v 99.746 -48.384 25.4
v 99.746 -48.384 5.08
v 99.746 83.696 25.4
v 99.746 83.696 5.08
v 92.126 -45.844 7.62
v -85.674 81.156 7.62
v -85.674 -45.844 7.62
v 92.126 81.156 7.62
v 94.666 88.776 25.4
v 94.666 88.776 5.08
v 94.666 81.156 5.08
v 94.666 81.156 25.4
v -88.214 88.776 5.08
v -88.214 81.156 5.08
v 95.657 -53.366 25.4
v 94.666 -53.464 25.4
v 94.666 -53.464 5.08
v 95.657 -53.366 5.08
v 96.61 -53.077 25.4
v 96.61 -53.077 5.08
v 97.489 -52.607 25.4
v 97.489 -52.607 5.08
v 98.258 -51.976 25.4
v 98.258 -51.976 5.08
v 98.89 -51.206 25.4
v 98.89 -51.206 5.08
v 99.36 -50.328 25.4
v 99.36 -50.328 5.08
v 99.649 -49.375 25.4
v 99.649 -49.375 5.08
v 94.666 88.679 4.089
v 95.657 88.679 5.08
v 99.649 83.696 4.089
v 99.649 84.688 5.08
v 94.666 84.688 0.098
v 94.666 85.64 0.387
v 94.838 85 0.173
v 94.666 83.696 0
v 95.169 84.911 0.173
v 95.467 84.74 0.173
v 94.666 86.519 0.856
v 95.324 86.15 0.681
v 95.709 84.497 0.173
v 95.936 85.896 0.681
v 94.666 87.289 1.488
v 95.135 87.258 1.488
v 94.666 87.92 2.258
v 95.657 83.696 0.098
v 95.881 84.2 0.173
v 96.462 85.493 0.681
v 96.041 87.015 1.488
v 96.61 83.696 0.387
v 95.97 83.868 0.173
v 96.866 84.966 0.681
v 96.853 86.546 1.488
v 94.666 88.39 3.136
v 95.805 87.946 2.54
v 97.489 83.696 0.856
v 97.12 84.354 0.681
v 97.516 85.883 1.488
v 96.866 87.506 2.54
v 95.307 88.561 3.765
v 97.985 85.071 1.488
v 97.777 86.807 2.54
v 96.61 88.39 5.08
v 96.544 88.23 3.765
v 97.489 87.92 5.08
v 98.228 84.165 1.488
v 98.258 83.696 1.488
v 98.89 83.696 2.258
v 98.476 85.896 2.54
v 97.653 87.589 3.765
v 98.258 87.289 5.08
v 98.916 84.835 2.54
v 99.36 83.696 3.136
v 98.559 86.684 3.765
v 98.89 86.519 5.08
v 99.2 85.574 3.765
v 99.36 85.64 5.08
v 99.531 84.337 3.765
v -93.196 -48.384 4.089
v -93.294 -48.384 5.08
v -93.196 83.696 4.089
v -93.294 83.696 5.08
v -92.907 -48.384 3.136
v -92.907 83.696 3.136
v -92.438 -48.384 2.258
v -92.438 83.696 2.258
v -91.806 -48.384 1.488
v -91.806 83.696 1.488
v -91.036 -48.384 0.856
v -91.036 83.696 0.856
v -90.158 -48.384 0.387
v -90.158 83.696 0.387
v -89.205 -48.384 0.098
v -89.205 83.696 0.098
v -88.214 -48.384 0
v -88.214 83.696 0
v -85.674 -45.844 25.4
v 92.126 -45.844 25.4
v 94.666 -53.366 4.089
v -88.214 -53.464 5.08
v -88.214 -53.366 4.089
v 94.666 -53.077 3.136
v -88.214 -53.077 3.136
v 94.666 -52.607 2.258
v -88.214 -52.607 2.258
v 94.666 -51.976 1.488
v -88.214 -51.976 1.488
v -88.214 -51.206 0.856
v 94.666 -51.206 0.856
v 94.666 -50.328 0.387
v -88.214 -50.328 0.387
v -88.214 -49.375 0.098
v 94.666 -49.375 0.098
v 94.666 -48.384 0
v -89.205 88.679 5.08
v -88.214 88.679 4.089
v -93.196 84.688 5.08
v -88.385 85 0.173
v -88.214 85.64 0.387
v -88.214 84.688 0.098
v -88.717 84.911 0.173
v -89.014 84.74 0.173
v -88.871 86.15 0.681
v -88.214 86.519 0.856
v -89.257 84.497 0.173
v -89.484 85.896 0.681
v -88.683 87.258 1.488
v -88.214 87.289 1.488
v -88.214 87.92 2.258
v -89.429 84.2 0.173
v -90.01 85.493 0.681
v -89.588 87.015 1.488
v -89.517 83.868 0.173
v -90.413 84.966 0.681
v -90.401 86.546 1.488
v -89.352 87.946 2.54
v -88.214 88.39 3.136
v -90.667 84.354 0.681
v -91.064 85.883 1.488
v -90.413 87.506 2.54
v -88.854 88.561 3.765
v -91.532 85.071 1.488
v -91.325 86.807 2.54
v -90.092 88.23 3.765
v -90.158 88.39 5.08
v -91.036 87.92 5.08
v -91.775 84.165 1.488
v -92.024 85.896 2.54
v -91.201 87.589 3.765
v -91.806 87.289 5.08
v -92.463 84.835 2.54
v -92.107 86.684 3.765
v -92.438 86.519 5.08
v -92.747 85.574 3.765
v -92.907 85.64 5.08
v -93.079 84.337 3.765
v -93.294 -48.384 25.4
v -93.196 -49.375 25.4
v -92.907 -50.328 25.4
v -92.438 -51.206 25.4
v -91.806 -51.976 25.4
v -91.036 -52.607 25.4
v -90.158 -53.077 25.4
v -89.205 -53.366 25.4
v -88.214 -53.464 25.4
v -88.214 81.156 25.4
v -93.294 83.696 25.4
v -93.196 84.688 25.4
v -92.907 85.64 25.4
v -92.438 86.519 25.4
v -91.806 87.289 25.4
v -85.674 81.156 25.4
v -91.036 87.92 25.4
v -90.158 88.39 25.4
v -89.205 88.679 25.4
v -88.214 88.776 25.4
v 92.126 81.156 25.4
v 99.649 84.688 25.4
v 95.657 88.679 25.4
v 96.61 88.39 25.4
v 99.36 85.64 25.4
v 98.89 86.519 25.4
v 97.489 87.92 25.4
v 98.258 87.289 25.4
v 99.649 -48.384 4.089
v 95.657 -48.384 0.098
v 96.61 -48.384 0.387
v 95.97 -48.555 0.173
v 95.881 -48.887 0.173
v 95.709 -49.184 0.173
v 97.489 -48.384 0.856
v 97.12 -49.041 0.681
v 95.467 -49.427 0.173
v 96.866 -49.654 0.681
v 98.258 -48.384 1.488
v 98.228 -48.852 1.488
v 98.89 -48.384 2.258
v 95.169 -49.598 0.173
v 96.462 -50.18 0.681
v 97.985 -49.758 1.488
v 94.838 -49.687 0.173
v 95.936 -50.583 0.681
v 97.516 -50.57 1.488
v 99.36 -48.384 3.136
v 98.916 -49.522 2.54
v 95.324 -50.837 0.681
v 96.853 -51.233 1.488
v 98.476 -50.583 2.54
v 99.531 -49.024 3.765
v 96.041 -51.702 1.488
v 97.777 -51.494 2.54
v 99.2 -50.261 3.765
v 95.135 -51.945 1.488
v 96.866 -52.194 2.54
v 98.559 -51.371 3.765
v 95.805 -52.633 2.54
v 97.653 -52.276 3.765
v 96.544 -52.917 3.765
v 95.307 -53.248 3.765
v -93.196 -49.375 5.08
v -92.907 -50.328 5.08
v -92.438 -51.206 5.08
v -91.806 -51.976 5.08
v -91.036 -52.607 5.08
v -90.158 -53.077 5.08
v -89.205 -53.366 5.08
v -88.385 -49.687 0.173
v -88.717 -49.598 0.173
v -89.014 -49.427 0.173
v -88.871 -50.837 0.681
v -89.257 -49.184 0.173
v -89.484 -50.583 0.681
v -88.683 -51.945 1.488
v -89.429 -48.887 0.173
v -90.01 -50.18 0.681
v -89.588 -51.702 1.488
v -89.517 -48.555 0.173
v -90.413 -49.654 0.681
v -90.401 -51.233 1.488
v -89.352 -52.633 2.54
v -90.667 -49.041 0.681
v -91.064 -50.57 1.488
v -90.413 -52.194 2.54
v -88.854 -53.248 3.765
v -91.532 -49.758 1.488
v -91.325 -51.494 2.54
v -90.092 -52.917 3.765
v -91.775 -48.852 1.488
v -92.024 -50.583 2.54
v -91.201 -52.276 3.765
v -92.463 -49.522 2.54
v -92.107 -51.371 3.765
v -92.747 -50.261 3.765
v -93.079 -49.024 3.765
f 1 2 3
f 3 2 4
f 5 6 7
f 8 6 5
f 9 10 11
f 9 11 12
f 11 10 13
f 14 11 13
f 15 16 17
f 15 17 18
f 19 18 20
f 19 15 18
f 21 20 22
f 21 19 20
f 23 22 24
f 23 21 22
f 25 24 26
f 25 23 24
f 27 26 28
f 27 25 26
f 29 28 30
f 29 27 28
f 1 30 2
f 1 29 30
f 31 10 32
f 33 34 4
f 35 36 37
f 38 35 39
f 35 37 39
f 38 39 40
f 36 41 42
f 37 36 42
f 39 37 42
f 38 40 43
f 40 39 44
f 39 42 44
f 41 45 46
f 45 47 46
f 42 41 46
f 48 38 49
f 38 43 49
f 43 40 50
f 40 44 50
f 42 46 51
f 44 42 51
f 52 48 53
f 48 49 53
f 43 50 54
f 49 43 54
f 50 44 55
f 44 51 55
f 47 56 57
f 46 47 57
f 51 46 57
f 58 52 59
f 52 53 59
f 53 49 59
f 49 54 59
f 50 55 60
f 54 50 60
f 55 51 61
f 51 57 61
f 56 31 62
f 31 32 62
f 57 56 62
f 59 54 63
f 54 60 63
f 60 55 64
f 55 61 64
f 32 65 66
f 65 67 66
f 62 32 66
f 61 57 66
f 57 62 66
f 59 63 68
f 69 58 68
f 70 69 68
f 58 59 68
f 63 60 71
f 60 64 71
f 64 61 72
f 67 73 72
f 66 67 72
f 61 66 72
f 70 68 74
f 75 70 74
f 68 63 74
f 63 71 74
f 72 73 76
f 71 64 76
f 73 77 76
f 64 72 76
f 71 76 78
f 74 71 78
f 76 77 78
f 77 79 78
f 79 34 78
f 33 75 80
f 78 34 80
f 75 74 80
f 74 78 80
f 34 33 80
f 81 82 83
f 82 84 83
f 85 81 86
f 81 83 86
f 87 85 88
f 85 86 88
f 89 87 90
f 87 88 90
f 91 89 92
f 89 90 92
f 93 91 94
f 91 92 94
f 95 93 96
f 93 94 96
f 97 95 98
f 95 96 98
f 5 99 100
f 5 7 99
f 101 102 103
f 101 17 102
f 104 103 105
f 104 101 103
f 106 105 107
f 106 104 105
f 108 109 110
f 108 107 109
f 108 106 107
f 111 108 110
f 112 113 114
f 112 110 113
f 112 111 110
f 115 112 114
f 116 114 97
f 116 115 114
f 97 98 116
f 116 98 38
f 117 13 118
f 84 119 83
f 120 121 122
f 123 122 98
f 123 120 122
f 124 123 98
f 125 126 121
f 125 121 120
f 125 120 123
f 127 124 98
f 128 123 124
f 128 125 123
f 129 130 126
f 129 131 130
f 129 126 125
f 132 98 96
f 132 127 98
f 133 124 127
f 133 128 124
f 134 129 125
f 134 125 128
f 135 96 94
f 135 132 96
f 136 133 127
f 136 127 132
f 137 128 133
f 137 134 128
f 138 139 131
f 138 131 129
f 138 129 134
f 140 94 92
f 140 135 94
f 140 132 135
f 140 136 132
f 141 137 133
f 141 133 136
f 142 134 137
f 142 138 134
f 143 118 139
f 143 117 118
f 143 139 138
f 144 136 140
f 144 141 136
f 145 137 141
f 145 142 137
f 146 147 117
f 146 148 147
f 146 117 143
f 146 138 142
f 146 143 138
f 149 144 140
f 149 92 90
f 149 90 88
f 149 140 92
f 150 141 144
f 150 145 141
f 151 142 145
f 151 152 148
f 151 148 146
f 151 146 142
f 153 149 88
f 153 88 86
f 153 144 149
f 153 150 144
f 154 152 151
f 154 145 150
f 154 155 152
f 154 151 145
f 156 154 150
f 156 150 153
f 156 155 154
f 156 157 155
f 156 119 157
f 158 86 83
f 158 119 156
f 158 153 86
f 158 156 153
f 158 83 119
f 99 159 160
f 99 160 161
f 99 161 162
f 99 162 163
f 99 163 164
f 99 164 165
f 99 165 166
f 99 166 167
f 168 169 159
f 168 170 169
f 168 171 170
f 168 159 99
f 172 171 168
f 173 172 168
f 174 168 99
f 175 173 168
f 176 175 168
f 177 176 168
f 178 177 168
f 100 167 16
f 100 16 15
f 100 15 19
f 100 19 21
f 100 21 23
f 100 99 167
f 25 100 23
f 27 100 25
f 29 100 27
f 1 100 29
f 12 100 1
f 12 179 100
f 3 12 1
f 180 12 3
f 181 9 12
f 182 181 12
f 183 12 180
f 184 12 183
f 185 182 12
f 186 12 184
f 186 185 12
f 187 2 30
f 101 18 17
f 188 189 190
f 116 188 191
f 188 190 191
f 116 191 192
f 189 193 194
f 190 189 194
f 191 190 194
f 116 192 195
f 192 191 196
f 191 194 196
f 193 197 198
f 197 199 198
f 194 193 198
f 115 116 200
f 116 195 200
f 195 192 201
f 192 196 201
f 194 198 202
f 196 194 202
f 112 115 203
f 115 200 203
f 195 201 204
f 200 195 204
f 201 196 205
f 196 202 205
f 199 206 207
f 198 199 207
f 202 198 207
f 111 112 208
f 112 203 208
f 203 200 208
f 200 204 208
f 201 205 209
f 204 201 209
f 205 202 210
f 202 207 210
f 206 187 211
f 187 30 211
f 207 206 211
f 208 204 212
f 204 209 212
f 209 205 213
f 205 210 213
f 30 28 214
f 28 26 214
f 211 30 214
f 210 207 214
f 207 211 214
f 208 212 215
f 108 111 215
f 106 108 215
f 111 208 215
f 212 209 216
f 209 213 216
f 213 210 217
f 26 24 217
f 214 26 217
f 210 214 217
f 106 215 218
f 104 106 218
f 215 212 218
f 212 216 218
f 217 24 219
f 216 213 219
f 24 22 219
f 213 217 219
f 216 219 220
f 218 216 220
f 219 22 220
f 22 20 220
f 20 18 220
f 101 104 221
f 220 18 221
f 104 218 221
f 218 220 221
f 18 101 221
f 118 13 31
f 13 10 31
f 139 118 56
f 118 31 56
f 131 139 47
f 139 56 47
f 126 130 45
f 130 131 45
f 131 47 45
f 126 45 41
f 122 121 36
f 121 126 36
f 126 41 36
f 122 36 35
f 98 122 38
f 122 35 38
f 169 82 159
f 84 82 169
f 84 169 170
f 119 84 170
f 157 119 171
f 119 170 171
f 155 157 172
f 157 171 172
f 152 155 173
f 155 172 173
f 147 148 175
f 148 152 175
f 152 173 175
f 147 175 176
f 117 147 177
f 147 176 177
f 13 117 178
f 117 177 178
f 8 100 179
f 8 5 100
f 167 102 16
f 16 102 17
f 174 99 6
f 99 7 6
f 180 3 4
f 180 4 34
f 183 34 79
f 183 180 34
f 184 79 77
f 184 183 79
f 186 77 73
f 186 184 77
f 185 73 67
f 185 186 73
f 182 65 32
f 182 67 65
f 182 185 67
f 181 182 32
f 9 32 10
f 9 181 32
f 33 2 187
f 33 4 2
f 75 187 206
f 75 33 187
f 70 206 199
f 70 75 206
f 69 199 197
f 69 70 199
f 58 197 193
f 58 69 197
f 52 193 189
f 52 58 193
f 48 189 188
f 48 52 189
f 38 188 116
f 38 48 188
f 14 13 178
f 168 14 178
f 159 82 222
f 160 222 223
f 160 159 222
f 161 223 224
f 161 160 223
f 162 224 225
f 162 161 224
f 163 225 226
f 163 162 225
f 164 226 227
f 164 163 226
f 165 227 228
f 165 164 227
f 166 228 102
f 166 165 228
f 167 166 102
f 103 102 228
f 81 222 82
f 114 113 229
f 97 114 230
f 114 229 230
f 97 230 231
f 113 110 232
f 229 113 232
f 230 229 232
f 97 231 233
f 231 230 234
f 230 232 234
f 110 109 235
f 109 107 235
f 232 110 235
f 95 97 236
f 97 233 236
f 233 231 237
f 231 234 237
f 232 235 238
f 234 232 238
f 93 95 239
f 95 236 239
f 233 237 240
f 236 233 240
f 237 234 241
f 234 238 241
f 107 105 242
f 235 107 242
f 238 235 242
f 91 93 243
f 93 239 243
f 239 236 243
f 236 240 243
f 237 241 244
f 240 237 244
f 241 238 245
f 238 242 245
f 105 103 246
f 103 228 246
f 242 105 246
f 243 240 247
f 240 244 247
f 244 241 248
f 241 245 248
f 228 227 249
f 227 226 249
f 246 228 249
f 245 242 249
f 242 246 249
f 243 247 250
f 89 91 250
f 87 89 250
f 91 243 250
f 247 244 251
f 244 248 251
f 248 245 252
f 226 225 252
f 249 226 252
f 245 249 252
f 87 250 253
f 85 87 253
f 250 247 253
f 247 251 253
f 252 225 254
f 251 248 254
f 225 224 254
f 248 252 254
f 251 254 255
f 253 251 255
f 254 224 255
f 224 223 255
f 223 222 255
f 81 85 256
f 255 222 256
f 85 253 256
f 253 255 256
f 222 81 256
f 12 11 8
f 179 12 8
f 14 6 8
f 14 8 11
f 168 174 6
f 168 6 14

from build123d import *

# Parameters (mm, degrees)
F0_W      = 193.04
F0_H      = 142.24
F1_DEPTH  = 25.4
F2_T      = -7.62
F3_R      = 5.08
F1_FACE_W = 182.88
F1_FACE_H = 20.32
F4_DEPTH  = 7.62


with BuildPart() as f1:
    # F0 (on Top) → F1 (new body)
    with BuildSketch(Plane.XY):
        with Locations((3.226209, 17.656468)):
            Rectangle(F0_W, F0_H)
    extrude(amount=F1_DEPTH)

    # F2
    f2_openings = [f1.faces().sort_by_distance(p)[0] for p in [
        (3.226209, 17.656468, 25.4),
    ]]
    offset(amount=F2_T, openings=f2_openings)

    # F3
    f3_edges = [f1.edges().sort_by_distance(p)[0] for p in [
        (-93.293791, -53.463532, 12.7),
        (-93.293791, 88.776468, 12.7),
        (99.746209, 88.776468, 12.7),
        (99.746209, -53.463532, 12.7),
        (3.226209, 88.776468, 0),
        (99.746209, 17.656468, 0),
        (3.226209, -53.463532, 0),
        (-93.293791, 17.656468, 0),
    ]]
    fillet(f3_edges, radius=F3_R)

    # F1_face (on face) → F4 (cut)
    with BuildSketch(Plane(origin=(3.226209, 88.776468, 15.24), x_dir=(-1, 0, 0), z_dir=(0, 1, 0))):
        Rectangle(F1_FACE_W, F1_FACE_H)
    extrude(amount=-F4_DEPTH, mode=Mode.SUBTRACT)


solid = f1.part
